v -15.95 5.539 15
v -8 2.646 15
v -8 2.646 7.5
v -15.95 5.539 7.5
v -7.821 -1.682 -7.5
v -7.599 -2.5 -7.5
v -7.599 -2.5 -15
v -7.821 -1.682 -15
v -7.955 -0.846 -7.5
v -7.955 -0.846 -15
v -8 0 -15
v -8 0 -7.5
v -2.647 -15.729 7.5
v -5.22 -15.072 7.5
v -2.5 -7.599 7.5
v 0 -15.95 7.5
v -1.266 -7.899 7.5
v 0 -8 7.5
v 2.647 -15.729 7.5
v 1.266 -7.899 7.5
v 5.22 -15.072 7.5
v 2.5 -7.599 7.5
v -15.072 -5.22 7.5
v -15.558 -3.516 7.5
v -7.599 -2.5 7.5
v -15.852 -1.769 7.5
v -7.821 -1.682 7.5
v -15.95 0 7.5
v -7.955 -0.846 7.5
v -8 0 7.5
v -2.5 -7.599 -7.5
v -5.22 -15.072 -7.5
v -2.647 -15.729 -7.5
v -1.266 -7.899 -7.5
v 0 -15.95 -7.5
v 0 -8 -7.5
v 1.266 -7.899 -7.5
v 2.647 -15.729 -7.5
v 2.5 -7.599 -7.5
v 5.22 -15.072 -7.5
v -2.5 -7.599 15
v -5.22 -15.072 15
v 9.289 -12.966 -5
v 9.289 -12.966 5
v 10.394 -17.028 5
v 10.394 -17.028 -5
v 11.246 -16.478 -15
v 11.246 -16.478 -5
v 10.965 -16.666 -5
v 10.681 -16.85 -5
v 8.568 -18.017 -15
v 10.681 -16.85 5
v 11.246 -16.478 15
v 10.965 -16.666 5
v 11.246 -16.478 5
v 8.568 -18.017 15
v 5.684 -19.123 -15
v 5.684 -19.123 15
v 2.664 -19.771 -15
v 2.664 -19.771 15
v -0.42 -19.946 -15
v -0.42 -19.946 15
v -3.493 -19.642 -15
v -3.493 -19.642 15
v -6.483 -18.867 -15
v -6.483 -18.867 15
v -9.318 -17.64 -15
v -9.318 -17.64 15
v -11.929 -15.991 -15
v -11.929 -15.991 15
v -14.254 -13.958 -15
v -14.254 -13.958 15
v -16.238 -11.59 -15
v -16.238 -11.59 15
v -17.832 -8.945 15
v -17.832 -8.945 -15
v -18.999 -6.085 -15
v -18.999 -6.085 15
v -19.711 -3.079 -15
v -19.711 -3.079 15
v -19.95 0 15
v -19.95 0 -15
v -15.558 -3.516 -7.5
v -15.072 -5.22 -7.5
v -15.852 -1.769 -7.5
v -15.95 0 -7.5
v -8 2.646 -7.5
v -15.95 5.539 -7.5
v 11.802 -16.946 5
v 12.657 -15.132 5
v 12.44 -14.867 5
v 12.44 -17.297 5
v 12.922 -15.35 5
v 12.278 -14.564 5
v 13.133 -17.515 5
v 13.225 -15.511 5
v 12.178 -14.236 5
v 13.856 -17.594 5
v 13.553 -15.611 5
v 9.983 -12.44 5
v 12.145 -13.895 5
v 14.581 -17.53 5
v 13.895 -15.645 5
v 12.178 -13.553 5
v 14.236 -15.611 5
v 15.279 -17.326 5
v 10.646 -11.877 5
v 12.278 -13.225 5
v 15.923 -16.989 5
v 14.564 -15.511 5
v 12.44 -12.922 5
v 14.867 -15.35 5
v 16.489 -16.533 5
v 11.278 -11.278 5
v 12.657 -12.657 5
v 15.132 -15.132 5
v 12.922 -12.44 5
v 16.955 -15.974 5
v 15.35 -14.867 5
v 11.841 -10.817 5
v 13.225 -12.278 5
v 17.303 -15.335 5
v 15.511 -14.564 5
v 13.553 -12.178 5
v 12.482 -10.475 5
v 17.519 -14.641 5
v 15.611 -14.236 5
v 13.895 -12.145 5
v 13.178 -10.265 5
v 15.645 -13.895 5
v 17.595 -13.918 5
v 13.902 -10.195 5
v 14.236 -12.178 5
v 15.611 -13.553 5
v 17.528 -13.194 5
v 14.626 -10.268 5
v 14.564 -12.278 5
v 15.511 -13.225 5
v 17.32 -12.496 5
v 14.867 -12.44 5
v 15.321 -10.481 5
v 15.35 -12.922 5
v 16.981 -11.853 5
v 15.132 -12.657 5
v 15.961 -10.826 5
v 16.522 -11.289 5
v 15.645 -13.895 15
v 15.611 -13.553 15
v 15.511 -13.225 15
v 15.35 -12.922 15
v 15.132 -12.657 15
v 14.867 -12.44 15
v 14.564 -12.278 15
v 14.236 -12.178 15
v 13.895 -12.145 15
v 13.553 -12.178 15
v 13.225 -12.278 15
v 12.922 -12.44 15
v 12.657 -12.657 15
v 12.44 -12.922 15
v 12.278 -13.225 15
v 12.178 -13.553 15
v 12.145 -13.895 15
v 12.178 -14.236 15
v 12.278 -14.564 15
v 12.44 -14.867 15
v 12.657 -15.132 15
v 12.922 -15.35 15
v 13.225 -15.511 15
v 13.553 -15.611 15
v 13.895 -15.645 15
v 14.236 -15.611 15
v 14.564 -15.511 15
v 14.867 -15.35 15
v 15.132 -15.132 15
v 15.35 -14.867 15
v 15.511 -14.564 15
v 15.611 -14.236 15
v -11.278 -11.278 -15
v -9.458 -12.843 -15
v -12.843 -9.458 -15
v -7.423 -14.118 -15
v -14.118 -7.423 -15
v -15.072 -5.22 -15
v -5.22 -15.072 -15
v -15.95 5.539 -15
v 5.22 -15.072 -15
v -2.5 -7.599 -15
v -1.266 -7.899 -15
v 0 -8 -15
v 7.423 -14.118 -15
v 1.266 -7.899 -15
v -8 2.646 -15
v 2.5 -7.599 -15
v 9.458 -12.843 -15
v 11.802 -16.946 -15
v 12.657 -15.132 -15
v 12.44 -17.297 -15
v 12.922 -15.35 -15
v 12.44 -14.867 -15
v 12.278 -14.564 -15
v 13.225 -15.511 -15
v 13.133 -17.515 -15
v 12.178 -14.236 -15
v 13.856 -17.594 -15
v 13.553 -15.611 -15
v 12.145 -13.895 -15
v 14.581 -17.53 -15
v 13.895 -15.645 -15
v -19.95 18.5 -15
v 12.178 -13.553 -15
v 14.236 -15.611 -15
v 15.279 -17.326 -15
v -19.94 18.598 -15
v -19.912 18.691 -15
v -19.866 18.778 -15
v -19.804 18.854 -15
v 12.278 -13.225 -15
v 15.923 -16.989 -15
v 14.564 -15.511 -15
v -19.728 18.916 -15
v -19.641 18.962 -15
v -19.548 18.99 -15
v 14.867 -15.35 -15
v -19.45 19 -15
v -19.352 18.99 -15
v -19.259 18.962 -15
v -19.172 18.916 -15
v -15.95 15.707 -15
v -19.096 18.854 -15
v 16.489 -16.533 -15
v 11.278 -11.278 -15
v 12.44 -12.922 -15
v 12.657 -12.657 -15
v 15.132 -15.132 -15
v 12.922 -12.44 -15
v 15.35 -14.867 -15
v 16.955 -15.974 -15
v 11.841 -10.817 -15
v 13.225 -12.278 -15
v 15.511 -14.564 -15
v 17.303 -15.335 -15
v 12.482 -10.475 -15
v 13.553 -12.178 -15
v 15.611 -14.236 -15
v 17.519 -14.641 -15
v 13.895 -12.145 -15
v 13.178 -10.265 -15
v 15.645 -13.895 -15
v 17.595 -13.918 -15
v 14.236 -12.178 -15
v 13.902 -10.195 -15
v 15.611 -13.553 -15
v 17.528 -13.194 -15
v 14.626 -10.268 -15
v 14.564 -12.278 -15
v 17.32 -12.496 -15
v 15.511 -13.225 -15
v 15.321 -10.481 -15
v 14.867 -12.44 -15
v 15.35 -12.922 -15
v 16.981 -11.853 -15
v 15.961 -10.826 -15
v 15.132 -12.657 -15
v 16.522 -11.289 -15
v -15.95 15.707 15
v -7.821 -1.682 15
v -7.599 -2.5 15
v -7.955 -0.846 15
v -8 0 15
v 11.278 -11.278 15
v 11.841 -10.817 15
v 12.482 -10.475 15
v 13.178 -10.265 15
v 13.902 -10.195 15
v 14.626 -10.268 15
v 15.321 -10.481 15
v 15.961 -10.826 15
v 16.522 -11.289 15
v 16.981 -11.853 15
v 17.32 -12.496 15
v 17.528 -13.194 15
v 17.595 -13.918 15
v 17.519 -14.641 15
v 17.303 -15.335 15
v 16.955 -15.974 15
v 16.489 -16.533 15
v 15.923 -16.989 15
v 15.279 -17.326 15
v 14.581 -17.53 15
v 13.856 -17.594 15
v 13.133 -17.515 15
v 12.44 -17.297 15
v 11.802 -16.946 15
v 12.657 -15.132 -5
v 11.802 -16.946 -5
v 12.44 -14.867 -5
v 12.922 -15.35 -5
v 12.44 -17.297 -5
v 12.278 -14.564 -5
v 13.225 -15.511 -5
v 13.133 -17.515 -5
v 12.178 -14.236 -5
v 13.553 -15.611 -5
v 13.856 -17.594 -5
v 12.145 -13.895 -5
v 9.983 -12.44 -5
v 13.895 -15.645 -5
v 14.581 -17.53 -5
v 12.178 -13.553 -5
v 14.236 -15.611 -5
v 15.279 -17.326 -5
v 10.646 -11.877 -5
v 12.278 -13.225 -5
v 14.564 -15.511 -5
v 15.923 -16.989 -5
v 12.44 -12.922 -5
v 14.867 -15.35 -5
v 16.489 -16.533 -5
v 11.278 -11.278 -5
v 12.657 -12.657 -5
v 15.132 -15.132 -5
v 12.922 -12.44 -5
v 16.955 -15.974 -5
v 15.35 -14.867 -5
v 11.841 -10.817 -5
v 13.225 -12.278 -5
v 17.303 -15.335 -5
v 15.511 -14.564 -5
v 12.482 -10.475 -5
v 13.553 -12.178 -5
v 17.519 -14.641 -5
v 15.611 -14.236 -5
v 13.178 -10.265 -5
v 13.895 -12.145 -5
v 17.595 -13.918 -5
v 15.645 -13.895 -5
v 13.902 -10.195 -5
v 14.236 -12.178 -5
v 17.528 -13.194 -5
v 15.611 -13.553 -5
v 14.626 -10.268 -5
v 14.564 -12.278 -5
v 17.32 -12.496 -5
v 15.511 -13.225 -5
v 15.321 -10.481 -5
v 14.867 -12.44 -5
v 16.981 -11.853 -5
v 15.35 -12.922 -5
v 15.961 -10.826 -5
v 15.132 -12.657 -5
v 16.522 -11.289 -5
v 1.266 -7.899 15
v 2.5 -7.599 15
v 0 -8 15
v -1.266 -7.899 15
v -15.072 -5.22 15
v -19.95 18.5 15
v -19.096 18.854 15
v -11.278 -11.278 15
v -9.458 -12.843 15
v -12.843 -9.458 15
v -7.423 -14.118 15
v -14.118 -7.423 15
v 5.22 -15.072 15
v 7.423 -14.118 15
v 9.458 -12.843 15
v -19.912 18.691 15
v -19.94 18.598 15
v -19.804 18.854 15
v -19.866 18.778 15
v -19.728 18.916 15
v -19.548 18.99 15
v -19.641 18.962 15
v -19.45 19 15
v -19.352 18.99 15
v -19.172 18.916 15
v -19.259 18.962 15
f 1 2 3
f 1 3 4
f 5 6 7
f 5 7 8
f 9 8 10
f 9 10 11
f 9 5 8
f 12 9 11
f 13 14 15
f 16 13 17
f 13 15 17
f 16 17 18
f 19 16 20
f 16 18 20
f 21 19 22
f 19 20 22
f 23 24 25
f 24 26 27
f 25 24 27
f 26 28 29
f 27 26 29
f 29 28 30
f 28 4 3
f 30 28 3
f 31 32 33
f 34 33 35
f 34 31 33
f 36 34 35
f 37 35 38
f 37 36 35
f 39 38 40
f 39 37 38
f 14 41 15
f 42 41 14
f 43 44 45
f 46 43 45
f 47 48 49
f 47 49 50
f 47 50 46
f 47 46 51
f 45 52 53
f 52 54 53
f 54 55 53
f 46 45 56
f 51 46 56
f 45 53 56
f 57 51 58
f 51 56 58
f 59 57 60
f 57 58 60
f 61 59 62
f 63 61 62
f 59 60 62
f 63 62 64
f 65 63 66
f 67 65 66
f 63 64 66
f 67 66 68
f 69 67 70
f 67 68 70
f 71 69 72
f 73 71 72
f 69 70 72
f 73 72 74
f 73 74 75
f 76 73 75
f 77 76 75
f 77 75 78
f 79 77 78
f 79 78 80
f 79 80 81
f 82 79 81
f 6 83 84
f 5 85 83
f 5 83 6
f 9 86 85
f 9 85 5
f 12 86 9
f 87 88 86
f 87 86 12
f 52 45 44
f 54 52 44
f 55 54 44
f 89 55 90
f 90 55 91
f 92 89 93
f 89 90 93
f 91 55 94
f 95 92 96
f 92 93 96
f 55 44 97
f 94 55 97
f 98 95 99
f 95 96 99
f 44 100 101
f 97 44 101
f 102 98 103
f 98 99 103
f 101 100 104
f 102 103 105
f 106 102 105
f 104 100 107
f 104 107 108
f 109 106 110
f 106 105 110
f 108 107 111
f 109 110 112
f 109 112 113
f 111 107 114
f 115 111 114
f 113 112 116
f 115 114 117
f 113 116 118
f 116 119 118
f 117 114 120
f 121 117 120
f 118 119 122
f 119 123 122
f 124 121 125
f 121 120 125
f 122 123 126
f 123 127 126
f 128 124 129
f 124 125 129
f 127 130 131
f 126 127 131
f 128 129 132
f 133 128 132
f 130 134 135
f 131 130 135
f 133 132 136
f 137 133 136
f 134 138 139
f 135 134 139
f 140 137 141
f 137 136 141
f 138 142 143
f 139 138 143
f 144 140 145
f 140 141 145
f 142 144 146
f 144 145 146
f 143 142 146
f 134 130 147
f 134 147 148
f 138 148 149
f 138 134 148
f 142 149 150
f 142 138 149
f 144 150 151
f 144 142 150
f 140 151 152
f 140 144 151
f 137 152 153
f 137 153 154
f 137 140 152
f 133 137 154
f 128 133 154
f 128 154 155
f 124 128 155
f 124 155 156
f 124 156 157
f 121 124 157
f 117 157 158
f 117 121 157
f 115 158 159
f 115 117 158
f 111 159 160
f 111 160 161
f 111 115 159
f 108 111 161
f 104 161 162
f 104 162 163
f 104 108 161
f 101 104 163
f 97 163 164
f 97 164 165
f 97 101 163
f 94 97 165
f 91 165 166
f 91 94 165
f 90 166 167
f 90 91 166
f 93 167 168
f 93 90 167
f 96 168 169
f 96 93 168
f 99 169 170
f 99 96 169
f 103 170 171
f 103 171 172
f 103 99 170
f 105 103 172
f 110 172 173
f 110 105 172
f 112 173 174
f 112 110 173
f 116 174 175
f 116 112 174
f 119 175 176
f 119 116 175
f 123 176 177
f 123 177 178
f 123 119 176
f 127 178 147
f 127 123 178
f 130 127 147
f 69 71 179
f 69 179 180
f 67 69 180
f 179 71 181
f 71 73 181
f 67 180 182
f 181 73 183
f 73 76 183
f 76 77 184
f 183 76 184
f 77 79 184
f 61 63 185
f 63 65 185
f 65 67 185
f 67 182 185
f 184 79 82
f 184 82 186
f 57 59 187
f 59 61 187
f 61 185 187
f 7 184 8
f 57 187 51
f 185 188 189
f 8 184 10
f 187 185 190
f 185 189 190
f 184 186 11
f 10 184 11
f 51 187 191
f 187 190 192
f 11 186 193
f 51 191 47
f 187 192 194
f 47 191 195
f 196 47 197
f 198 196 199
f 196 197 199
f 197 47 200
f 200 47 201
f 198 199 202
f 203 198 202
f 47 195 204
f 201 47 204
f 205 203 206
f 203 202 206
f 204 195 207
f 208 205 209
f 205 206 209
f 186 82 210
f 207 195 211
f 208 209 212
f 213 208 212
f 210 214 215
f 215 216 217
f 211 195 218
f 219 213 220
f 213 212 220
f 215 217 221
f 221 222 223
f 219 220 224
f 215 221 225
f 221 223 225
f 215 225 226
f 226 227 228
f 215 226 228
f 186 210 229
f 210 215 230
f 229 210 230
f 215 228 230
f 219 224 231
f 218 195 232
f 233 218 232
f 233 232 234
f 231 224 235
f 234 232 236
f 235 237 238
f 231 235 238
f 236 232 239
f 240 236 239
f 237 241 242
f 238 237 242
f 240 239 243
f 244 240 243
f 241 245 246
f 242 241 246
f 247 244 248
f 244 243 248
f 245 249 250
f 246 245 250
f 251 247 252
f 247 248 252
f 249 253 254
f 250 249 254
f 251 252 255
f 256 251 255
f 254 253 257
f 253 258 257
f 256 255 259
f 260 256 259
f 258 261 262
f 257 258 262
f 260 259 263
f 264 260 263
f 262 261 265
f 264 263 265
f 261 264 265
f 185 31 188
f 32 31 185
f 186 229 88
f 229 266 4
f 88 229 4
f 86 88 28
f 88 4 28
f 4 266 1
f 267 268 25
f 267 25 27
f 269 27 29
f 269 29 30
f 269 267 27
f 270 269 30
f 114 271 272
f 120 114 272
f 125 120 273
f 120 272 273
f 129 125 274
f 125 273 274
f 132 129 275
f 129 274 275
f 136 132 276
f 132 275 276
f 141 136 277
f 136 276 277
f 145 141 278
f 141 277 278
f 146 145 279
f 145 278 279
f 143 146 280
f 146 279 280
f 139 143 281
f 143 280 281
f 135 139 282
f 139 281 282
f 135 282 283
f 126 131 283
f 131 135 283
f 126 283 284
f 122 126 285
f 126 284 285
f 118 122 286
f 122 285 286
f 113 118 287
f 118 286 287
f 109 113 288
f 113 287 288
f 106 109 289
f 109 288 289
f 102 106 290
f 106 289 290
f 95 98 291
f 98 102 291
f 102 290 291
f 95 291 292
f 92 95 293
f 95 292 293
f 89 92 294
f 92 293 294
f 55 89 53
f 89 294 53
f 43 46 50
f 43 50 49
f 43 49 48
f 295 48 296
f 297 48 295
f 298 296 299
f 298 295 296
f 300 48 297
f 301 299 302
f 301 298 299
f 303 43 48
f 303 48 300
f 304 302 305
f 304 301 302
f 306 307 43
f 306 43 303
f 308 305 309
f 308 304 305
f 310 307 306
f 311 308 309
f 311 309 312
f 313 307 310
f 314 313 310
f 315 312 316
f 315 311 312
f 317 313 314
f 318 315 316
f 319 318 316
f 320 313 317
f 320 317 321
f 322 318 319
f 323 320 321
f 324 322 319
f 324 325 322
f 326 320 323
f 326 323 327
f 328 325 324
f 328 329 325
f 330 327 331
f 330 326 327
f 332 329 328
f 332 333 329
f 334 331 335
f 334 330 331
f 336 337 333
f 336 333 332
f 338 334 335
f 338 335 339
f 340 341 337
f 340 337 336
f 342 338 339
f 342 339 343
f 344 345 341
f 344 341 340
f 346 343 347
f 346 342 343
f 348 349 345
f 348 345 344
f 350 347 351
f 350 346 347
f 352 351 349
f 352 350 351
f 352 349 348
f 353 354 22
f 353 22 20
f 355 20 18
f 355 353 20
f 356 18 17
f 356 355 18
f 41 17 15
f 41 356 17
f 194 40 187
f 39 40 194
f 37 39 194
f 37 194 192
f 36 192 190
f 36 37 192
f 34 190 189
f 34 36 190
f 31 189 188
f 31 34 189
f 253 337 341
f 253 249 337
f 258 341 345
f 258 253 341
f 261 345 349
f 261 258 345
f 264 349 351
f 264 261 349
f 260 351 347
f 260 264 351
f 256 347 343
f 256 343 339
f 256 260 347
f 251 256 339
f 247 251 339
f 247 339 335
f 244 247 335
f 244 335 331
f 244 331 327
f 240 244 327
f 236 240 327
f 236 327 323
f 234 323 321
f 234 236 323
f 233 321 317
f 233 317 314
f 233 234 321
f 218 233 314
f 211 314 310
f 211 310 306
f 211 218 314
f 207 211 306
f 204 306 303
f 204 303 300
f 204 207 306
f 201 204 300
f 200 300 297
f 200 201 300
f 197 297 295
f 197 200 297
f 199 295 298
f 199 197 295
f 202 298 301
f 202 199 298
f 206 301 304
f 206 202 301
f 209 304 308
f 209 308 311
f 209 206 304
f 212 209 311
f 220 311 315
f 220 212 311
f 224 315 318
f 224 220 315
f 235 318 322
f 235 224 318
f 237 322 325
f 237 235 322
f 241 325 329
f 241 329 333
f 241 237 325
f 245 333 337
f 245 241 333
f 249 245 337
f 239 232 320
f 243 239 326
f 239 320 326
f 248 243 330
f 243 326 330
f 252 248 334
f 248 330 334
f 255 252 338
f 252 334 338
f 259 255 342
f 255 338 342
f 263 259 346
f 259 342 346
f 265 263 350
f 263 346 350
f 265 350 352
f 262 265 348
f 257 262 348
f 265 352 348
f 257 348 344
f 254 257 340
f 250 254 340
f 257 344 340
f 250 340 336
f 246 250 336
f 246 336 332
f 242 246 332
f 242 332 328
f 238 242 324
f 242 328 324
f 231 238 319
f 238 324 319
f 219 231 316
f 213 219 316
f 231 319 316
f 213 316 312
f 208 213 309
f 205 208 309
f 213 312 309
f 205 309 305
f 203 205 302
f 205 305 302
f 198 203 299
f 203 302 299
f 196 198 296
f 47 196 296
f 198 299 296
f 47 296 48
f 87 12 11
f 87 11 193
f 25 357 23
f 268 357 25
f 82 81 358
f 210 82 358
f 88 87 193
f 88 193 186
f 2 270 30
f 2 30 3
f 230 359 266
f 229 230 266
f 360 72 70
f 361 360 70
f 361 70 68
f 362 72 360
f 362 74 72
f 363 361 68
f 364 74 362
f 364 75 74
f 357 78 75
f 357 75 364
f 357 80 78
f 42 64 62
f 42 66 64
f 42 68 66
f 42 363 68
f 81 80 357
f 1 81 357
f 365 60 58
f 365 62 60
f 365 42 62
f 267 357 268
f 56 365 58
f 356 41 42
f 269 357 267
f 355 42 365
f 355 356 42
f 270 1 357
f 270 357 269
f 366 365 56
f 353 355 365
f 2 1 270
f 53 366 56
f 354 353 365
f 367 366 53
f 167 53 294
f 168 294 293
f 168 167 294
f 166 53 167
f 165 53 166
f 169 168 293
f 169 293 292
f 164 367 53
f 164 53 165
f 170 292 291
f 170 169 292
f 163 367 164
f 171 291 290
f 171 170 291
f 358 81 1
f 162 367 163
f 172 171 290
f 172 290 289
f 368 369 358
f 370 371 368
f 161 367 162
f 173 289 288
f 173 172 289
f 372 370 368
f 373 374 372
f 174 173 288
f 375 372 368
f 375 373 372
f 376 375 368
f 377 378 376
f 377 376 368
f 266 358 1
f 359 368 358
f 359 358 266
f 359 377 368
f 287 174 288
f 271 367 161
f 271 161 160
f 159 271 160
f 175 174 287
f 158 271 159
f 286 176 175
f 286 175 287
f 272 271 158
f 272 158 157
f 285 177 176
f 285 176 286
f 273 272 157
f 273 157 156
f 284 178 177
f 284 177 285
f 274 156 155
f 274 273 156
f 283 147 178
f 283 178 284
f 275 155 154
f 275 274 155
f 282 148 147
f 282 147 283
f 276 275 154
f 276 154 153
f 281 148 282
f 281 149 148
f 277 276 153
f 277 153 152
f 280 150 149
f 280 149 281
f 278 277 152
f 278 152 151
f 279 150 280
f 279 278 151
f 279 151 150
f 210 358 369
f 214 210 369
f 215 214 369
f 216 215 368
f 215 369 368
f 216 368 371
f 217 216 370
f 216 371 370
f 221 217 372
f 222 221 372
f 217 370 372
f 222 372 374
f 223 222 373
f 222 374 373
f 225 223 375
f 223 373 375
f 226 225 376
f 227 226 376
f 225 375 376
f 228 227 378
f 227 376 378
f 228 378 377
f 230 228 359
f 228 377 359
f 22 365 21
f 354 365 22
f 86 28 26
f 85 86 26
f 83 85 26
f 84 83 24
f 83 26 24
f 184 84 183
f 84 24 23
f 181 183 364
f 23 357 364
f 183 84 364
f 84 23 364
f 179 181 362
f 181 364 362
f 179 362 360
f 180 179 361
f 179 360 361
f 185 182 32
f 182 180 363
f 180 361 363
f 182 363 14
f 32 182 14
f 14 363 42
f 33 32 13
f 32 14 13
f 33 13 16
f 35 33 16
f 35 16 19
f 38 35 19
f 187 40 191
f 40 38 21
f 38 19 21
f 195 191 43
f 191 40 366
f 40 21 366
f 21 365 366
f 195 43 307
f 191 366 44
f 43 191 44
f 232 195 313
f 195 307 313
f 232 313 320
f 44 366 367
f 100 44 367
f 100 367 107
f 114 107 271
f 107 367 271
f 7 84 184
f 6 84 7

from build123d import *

# Parameters (mm, degrees)
SKETCH_1_R          = 1.75
EXTRUDE_1_DEPTH     = 15
EXTRUDE_START       = 15
EXTRUDE_2_DEPTH     = 7.5
EXTRUDE_START_2     = -7.5
EXTRUDE_3_DEPTH     = 7.5
SKETCH_1_5_R        = 1.75
CUT_EXTRUDE_2_DEPTH = 5


with BuildPart() as part:
    # Эскиз1 → Бобышка-Вытянуть1 (new, symmetric)
    with BuildSketch(Plane.XY):
        with BuildLine():
            Line((-15.95, 15.707106781), (-15.95, 0))
            ThreePointArc((-15.95, 0), (-6.103800746, -14.735878544), (11.27835316, -11.27835316))
            ThreePointArc((11.27835316, -11.27835316), (17.594576586, -13.917676686), (11.245989359, -16.478174151))
            ThreePointArc((11.245989359, -16.478174151), (-9.317859526, -17.640294608), (-19.95, 0))
            Line((-19.95, 0), (-19.95, 18.5))
            ThreePointArc((-19.95, 18.5), (-19.641341716, 18.961939766), (-19.096446609, 18.853553391))
            Line((-19.096446609, 18.853553391), (-15.95, 15.707106781))
        make_face()
        with Locations((13.89464825, -13.89464825)):
            Circle(SKETCH_1_R, mode=Mode.SUBTRACT)
    extrude(amount=EXTRUDE_1_DEPTH, both=True)

    # Эскиз1<3> → Бобышка-Вытянуть2 (add)
    with BuildSketch(Plane.XY.offset(EXTRUDE_START)):
        with BuildLine():
            ThreePointArc((-7.599342077, -2.5), (-7.899200485, -1.265950905), (-8, 0))
            Line((-8, 0), (-8, 2.645827558))
            Line((-8, 2.645827558), (-15.95, 5.539390921))
            Line((-15.95, 5.539390921), (-15.95, 0))
            ThreePointArc((-15.95, 0), (-15.728899355, -2.646549654), (-15.071727264, -5.219725787))
            Line((-15.071727264, -5.219725787), (-7.599342077, -2.5))
        make_face()
        with BuildLine():
            Line((-2.5, -7.599342077), (-5.219725787, -15.071727264))
            ThreePointArc((-5.219725787, -15.071727264), (0, -15.95), (5.219725787, -15.071727264))
            Line((5.219725787, -15.071727264), (2.5, -7.599342077))
            ThreePointArc((2.5, -7.599342077), (0, -8), (-2.5, -7.599342077))
        make_face()
    extrude(amount=-EXTRUDE_2_DEPTH)

    # Эскиз1<4> → Бобышка-Вытянуть3 (add)
    with BuildSketch(Plane.XY.offset(EXTRUDE_START_2)):
        with BuildLine():
            ThreePointArc((-7.599342077, -2.5), (-7.899200485, -1.265950905), (-8, 0))
            Line((-8, 0), (-8, 2.645827558))
            Line((-8, 2.645827558), (-15.95, 5.539390921))
            Line((-15.95, 5.539390921), (-15.95, 0))
            ThreePointArc((-15.95, 0), (-15.728899355, -2.646549654), (-15.071727264, -5.219725787))
            Line((-15.071727264, -5.219725787), (-7.599342077, -2.5))
        make_face()
        with BuildLine():
            Line((-2.5, -7.599342077), (-5.219725787, -15.071727264))
            ThreePointArc((-5.219725787, -15.071727264), (0, -15.95), (5.219725787, -15.071727264))
            Line((5.219725787, -15.071727264), (2.5, -7.599342077))
            ThreePointArc((2.5, -7.599342077), (0, -8), (-2.5, -7.599342077))
        make_face()
    extrude(amount=-EXTRUDE_3_DEPTH)

    # Эскиз1<5> → Вырез-Вытянуть2 (cut, symmetric)
    with BuildSketch(Plane.XY):
        with BuildLine():
            ThreePointArc((11.27835316, -11.27835316), (10.318427509, -12.162752721), (9.289403961, -12.965703762))
            Line((9.289403961, -12.965703762), (10.394358671, -17.028206242))
            ThreePointArc((10.394358671, -17.028206242), (10.823668488, -16.758600791), (11.245989359, -16.478174151))
            ThreePointArc((11.245989359, -16.478174151), (17.594576586, -13.917676686), (11.27835316, -11.27835316))
        make_face()
        with Locations((13.89464825, -13.89464825)):
            Circle(SKETCH_1_5_R, mode=Mode.SUBTRACT)
    extrude(amount=CUT_EXTRUDE_2_DEPTH, both=True, mode=Mode.SUBTRACT)


solid = part.part
